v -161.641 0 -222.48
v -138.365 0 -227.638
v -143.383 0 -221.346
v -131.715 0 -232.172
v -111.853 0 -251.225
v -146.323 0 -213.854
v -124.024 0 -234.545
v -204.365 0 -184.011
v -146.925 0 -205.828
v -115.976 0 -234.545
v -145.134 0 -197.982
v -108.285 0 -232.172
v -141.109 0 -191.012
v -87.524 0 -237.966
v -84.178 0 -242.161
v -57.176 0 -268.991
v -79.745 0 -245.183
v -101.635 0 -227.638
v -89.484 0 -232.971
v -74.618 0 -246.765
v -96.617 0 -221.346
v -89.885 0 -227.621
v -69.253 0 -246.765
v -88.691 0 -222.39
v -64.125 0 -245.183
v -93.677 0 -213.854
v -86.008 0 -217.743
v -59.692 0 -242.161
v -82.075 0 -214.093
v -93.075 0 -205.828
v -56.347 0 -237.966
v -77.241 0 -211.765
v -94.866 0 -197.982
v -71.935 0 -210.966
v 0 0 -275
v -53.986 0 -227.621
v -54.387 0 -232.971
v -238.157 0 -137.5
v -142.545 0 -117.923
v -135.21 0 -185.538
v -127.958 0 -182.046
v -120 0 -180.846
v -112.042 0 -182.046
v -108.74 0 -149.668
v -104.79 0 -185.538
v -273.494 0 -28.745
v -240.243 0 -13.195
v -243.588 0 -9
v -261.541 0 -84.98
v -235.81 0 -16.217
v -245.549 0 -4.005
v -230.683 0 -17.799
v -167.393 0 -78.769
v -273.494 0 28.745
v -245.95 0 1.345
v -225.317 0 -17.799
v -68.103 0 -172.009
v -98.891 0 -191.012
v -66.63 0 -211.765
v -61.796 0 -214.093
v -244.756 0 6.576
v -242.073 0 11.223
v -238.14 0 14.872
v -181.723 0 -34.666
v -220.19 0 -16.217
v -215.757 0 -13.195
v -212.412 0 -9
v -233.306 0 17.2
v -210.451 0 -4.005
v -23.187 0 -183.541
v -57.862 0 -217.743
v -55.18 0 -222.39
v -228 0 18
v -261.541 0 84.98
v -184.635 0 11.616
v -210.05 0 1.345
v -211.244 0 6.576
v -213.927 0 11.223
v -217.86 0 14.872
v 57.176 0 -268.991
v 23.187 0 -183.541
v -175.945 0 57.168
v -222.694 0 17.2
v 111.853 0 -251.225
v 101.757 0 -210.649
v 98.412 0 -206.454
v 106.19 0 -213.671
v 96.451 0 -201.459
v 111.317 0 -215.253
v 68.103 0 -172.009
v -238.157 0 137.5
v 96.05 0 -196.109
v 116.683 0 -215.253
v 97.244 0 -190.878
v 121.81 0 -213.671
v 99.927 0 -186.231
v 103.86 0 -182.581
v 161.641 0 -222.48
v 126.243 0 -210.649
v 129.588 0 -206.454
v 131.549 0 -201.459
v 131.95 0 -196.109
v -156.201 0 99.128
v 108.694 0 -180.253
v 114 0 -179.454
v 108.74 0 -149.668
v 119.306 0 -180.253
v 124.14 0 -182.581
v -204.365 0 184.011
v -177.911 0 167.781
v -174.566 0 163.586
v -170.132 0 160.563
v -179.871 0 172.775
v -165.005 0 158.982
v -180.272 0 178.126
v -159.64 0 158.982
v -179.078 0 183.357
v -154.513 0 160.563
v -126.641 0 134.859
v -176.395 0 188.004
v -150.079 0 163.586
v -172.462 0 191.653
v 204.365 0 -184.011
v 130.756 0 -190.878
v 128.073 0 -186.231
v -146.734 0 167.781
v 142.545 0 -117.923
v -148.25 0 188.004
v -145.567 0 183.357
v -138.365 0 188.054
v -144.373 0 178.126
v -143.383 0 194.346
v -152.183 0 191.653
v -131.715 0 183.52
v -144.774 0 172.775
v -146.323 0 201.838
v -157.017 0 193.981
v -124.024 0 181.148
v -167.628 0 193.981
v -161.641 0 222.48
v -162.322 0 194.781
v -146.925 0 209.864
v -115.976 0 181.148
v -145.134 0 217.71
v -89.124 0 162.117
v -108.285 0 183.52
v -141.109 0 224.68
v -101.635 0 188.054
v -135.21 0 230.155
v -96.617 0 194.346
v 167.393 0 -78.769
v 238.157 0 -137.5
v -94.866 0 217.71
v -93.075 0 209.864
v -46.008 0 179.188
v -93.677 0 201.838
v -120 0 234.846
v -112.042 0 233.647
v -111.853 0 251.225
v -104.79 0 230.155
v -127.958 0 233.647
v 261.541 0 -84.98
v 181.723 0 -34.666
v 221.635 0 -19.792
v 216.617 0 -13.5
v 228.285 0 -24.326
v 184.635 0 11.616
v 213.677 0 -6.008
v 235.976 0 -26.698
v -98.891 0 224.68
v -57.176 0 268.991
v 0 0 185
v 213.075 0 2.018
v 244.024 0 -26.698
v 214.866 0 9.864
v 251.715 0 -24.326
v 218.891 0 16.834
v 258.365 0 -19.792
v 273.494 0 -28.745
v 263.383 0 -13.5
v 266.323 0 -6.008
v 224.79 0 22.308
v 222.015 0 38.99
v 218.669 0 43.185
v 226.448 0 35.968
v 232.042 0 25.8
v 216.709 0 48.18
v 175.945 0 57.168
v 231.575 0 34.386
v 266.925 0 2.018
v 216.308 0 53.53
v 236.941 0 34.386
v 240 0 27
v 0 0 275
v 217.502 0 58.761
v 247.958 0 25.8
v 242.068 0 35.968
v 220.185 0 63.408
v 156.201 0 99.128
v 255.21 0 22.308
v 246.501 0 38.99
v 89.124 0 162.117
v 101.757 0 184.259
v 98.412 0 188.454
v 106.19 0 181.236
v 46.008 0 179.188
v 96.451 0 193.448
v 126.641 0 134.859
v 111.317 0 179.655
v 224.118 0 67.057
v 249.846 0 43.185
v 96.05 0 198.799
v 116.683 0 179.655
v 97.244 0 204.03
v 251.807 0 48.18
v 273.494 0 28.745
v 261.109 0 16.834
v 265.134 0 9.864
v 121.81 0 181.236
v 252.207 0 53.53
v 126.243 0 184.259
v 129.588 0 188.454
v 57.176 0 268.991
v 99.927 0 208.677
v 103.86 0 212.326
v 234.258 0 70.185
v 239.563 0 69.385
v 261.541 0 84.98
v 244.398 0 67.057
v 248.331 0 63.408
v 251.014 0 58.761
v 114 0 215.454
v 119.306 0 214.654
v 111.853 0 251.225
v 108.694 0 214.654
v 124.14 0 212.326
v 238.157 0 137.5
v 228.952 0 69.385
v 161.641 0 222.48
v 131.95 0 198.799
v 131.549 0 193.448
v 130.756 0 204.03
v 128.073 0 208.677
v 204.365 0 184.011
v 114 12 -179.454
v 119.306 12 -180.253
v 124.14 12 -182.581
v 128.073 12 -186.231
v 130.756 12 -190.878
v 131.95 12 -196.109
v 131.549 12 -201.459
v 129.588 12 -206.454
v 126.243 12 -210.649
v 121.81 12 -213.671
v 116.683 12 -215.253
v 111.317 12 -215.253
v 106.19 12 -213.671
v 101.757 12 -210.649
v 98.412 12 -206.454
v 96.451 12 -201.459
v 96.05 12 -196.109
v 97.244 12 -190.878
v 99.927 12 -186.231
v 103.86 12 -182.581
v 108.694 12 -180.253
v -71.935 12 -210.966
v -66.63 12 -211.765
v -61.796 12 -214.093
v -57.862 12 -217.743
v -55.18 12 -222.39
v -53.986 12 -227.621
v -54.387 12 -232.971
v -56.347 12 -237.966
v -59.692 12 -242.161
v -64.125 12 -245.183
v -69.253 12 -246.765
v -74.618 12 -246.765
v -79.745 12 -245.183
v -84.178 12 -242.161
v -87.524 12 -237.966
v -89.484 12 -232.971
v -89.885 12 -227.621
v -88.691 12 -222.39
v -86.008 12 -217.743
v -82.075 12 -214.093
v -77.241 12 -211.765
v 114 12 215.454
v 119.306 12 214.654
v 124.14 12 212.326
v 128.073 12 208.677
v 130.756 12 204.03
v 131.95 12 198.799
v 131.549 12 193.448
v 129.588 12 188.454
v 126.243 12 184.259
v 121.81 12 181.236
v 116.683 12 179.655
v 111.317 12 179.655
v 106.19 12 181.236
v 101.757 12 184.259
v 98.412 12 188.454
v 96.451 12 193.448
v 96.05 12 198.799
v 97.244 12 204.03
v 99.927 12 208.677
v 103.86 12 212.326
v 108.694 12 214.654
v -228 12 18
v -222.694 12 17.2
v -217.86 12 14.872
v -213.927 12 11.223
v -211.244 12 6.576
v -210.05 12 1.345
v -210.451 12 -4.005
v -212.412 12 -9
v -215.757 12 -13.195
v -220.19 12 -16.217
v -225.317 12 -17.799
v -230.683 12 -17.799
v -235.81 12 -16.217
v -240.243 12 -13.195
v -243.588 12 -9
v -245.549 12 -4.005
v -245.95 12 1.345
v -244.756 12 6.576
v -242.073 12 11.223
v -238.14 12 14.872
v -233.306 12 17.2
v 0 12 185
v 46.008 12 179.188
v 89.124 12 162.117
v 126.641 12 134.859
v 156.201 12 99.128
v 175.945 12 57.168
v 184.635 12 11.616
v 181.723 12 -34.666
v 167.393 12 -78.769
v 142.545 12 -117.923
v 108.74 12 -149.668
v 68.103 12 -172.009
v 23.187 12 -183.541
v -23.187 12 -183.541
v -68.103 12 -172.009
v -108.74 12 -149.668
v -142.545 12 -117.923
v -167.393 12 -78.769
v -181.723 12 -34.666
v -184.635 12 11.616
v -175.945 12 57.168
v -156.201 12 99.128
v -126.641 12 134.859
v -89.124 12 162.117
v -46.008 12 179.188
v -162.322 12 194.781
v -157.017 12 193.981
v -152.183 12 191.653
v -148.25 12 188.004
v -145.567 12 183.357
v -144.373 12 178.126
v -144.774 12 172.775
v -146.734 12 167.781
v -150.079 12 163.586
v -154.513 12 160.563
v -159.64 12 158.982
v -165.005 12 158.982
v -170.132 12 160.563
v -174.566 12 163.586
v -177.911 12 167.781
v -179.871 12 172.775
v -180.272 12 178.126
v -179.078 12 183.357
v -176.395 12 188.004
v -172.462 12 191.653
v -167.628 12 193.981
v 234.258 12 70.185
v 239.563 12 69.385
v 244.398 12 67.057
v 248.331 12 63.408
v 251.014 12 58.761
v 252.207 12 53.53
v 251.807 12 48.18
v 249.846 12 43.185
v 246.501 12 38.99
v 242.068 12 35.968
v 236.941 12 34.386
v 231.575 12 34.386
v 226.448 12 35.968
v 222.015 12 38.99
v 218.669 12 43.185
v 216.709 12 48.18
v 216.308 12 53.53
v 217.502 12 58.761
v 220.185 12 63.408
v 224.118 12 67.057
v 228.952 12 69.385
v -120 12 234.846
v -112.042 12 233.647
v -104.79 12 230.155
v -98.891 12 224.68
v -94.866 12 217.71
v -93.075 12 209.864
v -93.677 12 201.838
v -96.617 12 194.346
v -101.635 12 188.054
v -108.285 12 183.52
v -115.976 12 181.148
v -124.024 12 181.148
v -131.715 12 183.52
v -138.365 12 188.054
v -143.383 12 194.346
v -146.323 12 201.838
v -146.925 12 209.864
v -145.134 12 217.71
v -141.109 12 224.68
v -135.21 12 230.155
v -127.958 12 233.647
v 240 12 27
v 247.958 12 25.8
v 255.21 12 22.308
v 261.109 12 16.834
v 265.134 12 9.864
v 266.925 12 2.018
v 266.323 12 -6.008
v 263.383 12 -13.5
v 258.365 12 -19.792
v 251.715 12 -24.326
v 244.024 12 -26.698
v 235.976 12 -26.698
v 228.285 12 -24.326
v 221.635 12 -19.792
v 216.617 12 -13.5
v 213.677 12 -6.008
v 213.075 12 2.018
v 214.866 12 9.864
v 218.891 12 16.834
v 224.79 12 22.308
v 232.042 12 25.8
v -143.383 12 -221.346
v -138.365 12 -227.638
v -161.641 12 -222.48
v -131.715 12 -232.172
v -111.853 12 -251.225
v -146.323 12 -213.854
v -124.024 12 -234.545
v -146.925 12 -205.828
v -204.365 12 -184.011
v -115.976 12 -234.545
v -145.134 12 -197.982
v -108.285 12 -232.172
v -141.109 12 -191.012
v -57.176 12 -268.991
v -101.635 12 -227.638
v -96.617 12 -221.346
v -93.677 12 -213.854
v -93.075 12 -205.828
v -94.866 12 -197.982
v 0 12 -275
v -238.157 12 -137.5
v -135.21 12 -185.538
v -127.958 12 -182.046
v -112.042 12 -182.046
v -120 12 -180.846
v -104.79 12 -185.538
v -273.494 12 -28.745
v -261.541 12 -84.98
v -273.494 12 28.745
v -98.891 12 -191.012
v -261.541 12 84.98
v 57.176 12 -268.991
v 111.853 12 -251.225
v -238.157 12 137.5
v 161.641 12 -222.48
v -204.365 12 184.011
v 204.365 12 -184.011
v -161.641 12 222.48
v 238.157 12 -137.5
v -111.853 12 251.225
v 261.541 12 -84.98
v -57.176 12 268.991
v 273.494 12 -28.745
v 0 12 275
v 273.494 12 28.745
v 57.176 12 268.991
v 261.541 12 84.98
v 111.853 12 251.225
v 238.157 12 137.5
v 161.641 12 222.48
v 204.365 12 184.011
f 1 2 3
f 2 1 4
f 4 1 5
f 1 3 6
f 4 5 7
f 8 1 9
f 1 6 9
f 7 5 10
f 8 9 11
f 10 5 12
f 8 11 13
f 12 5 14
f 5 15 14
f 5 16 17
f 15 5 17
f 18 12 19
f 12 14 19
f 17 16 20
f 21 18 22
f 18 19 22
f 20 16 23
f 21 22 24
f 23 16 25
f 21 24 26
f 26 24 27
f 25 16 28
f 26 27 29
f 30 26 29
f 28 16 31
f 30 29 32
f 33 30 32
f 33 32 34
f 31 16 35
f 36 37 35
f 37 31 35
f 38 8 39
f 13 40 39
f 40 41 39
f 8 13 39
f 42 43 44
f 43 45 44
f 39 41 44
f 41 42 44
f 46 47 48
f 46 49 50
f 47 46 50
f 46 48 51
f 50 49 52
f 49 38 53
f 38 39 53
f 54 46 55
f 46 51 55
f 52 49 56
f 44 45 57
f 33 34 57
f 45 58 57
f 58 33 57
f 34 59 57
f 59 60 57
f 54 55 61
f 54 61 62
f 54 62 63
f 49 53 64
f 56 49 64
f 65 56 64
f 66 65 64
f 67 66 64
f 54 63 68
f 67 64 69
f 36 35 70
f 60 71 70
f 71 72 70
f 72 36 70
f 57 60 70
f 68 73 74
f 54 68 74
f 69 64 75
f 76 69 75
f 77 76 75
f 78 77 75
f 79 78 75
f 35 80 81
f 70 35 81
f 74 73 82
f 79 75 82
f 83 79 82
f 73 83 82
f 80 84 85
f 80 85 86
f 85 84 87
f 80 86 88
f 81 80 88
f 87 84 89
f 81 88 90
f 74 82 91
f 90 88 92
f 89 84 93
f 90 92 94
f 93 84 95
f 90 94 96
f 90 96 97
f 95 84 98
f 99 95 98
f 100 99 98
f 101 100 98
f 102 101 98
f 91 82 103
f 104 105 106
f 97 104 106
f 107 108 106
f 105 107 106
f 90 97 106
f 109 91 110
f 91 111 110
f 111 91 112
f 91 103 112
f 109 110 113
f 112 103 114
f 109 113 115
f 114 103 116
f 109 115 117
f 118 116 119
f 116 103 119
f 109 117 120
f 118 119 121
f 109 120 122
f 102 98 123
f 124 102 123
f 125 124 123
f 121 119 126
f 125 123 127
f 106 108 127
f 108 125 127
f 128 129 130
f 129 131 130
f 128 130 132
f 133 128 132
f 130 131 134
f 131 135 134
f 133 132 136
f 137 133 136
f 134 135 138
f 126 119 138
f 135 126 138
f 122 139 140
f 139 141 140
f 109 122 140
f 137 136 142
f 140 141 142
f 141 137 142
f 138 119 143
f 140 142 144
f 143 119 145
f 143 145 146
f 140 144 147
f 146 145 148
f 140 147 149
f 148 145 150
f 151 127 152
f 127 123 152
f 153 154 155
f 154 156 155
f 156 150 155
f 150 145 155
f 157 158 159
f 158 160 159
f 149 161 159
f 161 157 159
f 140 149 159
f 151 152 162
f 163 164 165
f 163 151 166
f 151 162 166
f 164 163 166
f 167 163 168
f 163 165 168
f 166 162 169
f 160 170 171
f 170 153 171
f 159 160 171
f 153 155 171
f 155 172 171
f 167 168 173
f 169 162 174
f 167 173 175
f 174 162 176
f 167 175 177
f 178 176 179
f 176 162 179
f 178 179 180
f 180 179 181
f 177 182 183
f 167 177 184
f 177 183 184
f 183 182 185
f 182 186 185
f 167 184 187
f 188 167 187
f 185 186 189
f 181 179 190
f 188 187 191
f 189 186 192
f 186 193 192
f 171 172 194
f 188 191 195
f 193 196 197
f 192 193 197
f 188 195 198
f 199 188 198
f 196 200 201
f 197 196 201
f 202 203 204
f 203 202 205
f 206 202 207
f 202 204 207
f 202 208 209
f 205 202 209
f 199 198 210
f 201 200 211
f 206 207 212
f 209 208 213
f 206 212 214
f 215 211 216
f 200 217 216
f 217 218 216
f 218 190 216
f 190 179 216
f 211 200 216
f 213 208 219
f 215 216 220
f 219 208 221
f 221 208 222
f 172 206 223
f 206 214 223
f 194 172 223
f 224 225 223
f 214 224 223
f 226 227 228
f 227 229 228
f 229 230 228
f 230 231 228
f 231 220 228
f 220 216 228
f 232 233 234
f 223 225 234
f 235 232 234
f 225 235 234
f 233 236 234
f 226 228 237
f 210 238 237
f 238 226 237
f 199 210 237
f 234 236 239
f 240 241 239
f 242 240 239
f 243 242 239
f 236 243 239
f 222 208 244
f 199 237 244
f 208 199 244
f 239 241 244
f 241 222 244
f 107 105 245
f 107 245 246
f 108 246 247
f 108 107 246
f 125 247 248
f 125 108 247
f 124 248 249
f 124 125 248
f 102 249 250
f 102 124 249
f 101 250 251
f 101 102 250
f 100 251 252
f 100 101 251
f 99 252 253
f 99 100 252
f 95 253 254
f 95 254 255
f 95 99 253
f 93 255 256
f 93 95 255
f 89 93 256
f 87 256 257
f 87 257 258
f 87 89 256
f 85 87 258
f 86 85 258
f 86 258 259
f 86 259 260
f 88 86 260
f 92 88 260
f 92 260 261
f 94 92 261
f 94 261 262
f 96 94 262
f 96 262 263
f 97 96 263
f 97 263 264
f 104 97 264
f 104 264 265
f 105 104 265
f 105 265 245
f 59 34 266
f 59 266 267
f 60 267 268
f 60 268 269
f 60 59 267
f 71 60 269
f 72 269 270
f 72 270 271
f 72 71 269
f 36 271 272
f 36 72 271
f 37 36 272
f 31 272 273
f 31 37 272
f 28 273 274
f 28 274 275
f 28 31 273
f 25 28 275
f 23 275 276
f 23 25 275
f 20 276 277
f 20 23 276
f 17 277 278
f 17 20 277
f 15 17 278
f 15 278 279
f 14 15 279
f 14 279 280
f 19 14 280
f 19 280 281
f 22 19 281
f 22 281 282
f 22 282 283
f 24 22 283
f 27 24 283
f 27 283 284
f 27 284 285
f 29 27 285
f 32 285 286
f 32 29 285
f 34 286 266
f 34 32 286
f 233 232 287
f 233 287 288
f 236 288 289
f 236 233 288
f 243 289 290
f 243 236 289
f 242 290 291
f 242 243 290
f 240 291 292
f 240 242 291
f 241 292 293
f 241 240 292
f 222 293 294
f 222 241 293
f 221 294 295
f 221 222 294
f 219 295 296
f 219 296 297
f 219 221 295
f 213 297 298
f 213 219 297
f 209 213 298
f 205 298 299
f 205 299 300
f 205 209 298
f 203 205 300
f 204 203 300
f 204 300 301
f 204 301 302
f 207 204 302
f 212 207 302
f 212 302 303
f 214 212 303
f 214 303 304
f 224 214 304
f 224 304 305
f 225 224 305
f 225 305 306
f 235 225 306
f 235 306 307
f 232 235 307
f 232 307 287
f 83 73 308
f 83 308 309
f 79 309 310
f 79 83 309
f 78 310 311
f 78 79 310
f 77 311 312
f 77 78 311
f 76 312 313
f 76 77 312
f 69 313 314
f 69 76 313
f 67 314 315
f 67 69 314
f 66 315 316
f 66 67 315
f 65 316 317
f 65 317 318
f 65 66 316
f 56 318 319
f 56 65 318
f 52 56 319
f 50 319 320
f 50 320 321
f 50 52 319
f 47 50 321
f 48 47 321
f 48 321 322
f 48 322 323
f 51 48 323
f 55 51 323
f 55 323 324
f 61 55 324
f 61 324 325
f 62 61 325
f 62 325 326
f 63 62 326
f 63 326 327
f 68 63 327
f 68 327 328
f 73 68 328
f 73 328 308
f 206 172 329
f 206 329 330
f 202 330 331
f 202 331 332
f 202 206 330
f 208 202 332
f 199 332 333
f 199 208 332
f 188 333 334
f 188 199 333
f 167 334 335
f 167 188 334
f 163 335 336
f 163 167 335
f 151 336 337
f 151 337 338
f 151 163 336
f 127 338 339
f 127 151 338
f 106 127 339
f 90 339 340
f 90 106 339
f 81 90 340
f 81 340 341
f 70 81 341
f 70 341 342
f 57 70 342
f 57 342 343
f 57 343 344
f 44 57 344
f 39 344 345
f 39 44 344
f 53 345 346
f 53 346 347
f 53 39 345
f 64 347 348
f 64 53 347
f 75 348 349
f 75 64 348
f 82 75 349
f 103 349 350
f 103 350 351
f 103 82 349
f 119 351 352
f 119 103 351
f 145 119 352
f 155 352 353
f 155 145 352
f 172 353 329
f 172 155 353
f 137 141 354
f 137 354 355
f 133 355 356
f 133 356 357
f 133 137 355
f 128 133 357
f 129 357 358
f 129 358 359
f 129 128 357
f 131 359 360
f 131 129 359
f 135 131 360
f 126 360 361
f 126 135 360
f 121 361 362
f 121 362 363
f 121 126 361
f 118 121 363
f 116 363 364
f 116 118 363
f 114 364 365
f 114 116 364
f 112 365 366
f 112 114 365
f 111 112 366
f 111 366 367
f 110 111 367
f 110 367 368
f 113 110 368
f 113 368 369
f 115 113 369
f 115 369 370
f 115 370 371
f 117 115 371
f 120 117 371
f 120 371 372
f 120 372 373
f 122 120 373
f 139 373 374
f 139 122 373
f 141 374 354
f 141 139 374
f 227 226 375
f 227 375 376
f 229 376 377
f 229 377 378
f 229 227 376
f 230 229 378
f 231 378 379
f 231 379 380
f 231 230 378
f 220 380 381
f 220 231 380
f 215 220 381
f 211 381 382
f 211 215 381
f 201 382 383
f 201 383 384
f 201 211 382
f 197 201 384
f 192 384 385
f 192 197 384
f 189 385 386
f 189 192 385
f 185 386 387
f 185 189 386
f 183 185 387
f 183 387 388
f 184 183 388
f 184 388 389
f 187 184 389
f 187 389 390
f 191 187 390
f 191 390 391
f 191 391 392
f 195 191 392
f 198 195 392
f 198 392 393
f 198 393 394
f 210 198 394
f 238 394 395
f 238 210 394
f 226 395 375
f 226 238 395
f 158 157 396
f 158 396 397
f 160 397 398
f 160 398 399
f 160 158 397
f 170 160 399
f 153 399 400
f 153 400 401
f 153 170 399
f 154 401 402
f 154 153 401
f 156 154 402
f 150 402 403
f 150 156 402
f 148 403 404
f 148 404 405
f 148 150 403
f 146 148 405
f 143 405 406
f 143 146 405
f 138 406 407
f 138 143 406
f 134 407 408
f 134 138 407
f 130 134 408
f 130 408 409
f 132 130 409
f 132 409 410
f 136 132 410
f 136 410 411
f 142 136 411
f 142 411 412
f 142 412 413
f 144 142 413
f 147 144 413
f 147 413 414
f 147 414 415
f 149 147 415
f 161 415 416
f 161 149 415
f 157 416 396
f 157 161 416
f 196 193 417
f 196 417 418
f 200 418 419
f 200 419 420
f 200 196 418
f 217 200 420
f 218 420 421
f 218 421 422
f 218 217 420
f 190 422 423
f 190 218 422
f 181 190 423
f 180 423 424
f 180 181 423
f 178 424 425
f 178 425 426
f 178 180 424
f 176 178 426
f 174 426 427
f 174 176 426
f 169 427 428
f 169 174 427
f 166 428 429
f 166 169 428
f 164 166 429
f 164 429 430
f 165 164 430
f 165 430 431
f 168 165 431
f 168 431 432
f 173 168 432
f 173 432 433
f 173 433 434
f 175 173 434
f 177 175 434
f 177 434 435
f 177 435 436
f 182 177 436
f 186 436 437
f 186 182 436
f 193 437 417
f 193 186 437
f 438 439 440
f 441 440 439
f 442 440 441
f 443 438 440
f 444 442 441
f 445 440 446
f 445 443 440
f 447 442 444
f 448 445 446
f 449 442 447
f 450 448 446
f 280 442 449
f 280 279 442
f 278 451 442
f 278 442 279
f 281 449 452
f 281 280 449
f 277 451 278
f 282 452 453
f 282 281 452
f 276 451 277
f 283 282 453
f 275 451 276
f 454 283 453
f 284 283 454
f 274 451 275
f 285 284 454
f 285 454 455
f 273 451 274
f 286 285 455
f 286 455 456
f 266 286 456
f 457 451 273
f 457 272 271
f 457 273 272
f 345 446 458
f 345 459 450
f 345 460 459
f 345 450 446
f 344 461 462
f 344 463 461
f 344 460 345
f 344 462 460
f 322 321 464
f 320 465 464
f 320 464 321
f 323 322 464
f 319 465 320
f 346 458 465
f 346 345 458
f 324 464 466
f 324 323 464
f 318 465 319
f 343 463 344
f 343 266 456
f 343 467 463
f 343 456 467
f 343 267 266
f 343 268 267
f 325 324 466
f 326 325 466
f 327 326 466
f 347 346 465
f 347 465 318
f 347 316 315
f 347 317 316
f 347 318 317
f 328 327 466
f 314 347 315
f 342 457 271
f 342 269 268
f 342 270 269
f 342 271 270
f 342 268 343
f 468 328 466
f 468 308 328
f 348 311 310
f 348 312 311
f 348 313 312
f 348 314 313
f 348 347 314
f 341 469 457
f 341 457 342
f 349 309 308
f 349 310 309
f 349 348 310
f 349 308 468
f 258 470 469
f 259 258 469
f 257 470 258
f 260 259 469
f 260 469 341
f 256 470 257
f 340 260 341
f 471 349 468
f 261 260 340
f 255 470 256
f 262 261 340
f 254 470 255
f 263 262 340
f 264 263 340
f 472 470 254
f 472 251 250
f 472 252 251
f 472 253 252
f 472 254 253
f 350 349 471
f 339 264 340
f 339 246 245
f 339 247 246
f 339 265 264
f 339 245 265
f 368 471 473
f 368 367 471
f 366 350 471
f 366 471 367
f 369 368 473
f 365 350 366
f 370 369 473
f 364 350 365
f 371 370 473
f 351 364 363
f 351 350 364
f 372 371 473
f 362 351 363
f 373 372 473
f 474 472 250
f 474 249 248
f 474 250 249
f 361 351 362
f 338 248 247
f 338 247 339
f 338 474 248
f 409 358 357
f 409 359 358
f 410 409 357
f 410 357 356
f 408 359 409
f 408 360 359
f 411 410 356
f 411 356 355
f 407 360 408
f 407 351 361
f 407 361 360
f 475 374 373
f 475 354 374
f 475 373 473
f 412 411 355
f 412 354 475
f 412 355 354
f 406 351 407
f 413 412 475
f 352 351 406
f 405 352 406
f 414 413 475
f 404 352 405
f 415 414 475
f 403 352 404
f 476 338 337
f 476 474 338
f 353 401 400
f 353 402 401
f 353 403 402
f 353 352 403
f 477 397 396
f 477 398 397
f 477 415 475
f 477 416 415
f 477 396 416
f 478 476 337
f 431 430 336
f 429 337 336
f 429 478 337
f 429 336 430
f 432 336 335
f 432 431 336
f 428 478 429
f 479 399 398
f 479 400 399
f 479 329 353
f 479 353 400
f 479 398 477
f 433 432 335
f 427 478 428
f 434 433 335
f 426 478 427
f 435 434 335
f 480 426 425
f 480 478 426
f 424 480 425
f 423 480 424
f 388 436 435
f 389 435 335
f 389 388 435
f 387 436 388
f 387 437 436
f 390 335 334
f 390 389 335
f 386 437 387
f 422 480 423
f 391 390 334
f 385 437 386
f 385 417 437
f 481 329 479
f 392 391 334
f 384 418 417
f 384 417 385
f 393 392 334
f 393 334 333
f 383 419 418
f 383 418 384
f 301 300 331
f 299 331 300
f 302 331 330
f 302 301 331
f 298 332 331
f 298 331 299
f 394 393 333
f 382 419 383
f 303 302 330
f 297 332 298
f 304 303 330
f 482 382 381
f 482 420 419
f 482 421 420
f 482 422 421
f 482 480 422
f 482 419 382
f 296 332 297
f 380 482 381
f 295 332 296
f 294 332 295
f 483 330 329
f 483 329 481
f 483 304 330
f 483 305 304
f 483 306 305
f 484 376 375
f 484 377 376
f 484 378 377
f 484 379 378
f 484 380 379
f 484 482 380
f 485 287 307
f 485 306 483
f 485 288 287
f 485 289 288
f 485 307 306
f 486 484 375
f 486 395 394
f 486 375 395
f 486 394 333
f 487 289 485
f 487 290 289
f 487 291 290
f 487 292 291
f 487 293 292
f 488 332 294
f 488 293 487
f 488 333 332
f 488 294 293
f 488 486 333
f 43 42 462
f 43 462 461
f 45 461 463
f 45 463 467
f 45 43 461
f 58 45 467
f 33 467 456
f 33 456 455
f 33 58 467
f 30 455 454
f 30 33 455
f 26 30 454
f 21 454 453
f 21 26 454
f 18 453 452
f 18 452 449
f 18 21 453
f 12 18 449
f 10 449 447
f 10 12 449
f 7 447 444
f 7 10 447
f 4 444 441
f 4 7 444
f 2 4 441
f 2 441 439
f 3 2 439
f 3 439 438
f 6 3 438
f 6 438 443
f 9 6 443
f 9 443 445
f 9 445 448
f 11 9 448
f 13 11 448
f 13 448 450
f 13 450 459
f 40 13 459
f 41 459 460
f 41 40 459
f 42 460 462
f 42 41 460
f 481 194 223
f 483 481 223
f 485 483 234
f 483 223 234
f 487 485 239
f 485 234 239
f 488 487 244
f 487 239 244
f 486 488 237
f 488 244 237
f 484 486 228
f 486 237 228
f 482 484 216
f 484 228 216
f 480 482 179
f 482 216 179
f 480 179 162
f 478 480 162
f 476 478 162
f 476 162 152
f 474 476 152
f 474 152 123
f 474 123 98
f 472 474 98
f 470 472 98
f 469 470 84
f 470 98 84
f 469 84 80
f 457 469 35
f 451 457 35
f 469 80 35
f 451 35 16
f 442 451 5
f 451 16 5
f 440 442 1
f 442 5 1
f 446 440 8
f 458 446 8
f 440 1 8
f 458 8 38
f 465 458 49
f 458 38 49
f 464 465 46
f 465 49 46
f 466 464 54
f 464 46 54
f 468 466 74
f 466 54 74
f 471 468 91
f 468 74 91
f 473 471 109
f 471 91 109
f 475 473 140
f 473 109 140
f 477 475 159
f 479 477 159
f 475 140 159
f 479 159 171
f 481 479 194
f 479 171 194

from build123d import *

# Parameters (mm, degrees)
SKETCH_3_R               = 275
SKETCH_3_R_2             = 185
SKETCH_3_R_3             = 27
SKETCH_3_R_4             = 18
EXTRUDE_1_DEPTH          = 12
CUT_EXTRUDE_2_DEPTH      = 12
CUT_EXTRUDE_2_DEPTH_BACK = 390.093819021
SKETCH_4_R               = 18


with BuildPart() as part:
    # 草图3 → 凸台-拉伸1 (new body)
    with BuildSketch(Plane(origin=(0, 0, 0), x_dir=(1, 0, 0), z_dir=(0, 1, 0))):
        with Locations(Location((0, 0, 0), (0, 0, 270))):
            Circle(SKETCH_3_R)
        with Locations(Location((0, 0, 0), (0, 0, 270))):
            Circle(SKETCH_3_R_2, mode=Mode.SUBTRACT)
        with Locations(Location((240, 0, 0), (0, 0, 270))):
            Circle(SKETCH_3_R_3, mode=Mode.SUBTRACT)
        with Locations(Location((234.2578125, -52.185029297, 0), (0, 0, 270))):
            Circle(SKETCH_3_R_4, mode=Mode.SUBTRACT)
        with Locations(Location((-120, -207.846096908, 0), (0, 0, 270))):
            Circle(SKETCH_3_R_3, mode=Mode.SUBTRACT)
        with Locations(Location((-120, 207.846096908, 0), (0, 0, 270))):
            Circle(SKETCH_3_R_3, mode=Mode.SUBTRACT)
        with Locations(Location((-71.935345182, 228.965731308, 0), (0, 0, 270))):
            Circle(SKETCH_3_R_4, mode=Mode.SUBTRACT)
        with Locations(Location((-162.322467318, -176.780702012, 0), (0, 0, 270))):
            Circle(SKETCH_3_R_4, mode=Mode.SUBTRACT)
    extrude(amount=EXTRUDE_1_DEPTH)

    # 草图4 → 切除-拉伸2 (cut, two sides: drawn at the far end of the back side and taken through both)
    with BuildSketch(Plane(origin=(0, 0, 0), x_dir=(1, 0, 0), z_dir=(0, 1, 0)).offset(-CUT_EXTRUDE_2_DEPTH_BACK)):
        with Locations(Location((-228, 0, 0), (0, 0, 270))):
            Circle(SKETCH_4_R)
        with Locations(Location((114, 197.453792063, 0), (0, 0, 270))):
            Circle(SKETCH_4_R)
        with Locations(Location((114, -197.453792063, 0), (0, 0, 270))):
            Circle(SKETCH_4_R)
    extrude(amount=CUT_EXTRUDE_2_DEPTH + CUT_EXTRUDE_2_DEPTH_BACK, mode=Mode.SUBTRACT)


solid = part.part
